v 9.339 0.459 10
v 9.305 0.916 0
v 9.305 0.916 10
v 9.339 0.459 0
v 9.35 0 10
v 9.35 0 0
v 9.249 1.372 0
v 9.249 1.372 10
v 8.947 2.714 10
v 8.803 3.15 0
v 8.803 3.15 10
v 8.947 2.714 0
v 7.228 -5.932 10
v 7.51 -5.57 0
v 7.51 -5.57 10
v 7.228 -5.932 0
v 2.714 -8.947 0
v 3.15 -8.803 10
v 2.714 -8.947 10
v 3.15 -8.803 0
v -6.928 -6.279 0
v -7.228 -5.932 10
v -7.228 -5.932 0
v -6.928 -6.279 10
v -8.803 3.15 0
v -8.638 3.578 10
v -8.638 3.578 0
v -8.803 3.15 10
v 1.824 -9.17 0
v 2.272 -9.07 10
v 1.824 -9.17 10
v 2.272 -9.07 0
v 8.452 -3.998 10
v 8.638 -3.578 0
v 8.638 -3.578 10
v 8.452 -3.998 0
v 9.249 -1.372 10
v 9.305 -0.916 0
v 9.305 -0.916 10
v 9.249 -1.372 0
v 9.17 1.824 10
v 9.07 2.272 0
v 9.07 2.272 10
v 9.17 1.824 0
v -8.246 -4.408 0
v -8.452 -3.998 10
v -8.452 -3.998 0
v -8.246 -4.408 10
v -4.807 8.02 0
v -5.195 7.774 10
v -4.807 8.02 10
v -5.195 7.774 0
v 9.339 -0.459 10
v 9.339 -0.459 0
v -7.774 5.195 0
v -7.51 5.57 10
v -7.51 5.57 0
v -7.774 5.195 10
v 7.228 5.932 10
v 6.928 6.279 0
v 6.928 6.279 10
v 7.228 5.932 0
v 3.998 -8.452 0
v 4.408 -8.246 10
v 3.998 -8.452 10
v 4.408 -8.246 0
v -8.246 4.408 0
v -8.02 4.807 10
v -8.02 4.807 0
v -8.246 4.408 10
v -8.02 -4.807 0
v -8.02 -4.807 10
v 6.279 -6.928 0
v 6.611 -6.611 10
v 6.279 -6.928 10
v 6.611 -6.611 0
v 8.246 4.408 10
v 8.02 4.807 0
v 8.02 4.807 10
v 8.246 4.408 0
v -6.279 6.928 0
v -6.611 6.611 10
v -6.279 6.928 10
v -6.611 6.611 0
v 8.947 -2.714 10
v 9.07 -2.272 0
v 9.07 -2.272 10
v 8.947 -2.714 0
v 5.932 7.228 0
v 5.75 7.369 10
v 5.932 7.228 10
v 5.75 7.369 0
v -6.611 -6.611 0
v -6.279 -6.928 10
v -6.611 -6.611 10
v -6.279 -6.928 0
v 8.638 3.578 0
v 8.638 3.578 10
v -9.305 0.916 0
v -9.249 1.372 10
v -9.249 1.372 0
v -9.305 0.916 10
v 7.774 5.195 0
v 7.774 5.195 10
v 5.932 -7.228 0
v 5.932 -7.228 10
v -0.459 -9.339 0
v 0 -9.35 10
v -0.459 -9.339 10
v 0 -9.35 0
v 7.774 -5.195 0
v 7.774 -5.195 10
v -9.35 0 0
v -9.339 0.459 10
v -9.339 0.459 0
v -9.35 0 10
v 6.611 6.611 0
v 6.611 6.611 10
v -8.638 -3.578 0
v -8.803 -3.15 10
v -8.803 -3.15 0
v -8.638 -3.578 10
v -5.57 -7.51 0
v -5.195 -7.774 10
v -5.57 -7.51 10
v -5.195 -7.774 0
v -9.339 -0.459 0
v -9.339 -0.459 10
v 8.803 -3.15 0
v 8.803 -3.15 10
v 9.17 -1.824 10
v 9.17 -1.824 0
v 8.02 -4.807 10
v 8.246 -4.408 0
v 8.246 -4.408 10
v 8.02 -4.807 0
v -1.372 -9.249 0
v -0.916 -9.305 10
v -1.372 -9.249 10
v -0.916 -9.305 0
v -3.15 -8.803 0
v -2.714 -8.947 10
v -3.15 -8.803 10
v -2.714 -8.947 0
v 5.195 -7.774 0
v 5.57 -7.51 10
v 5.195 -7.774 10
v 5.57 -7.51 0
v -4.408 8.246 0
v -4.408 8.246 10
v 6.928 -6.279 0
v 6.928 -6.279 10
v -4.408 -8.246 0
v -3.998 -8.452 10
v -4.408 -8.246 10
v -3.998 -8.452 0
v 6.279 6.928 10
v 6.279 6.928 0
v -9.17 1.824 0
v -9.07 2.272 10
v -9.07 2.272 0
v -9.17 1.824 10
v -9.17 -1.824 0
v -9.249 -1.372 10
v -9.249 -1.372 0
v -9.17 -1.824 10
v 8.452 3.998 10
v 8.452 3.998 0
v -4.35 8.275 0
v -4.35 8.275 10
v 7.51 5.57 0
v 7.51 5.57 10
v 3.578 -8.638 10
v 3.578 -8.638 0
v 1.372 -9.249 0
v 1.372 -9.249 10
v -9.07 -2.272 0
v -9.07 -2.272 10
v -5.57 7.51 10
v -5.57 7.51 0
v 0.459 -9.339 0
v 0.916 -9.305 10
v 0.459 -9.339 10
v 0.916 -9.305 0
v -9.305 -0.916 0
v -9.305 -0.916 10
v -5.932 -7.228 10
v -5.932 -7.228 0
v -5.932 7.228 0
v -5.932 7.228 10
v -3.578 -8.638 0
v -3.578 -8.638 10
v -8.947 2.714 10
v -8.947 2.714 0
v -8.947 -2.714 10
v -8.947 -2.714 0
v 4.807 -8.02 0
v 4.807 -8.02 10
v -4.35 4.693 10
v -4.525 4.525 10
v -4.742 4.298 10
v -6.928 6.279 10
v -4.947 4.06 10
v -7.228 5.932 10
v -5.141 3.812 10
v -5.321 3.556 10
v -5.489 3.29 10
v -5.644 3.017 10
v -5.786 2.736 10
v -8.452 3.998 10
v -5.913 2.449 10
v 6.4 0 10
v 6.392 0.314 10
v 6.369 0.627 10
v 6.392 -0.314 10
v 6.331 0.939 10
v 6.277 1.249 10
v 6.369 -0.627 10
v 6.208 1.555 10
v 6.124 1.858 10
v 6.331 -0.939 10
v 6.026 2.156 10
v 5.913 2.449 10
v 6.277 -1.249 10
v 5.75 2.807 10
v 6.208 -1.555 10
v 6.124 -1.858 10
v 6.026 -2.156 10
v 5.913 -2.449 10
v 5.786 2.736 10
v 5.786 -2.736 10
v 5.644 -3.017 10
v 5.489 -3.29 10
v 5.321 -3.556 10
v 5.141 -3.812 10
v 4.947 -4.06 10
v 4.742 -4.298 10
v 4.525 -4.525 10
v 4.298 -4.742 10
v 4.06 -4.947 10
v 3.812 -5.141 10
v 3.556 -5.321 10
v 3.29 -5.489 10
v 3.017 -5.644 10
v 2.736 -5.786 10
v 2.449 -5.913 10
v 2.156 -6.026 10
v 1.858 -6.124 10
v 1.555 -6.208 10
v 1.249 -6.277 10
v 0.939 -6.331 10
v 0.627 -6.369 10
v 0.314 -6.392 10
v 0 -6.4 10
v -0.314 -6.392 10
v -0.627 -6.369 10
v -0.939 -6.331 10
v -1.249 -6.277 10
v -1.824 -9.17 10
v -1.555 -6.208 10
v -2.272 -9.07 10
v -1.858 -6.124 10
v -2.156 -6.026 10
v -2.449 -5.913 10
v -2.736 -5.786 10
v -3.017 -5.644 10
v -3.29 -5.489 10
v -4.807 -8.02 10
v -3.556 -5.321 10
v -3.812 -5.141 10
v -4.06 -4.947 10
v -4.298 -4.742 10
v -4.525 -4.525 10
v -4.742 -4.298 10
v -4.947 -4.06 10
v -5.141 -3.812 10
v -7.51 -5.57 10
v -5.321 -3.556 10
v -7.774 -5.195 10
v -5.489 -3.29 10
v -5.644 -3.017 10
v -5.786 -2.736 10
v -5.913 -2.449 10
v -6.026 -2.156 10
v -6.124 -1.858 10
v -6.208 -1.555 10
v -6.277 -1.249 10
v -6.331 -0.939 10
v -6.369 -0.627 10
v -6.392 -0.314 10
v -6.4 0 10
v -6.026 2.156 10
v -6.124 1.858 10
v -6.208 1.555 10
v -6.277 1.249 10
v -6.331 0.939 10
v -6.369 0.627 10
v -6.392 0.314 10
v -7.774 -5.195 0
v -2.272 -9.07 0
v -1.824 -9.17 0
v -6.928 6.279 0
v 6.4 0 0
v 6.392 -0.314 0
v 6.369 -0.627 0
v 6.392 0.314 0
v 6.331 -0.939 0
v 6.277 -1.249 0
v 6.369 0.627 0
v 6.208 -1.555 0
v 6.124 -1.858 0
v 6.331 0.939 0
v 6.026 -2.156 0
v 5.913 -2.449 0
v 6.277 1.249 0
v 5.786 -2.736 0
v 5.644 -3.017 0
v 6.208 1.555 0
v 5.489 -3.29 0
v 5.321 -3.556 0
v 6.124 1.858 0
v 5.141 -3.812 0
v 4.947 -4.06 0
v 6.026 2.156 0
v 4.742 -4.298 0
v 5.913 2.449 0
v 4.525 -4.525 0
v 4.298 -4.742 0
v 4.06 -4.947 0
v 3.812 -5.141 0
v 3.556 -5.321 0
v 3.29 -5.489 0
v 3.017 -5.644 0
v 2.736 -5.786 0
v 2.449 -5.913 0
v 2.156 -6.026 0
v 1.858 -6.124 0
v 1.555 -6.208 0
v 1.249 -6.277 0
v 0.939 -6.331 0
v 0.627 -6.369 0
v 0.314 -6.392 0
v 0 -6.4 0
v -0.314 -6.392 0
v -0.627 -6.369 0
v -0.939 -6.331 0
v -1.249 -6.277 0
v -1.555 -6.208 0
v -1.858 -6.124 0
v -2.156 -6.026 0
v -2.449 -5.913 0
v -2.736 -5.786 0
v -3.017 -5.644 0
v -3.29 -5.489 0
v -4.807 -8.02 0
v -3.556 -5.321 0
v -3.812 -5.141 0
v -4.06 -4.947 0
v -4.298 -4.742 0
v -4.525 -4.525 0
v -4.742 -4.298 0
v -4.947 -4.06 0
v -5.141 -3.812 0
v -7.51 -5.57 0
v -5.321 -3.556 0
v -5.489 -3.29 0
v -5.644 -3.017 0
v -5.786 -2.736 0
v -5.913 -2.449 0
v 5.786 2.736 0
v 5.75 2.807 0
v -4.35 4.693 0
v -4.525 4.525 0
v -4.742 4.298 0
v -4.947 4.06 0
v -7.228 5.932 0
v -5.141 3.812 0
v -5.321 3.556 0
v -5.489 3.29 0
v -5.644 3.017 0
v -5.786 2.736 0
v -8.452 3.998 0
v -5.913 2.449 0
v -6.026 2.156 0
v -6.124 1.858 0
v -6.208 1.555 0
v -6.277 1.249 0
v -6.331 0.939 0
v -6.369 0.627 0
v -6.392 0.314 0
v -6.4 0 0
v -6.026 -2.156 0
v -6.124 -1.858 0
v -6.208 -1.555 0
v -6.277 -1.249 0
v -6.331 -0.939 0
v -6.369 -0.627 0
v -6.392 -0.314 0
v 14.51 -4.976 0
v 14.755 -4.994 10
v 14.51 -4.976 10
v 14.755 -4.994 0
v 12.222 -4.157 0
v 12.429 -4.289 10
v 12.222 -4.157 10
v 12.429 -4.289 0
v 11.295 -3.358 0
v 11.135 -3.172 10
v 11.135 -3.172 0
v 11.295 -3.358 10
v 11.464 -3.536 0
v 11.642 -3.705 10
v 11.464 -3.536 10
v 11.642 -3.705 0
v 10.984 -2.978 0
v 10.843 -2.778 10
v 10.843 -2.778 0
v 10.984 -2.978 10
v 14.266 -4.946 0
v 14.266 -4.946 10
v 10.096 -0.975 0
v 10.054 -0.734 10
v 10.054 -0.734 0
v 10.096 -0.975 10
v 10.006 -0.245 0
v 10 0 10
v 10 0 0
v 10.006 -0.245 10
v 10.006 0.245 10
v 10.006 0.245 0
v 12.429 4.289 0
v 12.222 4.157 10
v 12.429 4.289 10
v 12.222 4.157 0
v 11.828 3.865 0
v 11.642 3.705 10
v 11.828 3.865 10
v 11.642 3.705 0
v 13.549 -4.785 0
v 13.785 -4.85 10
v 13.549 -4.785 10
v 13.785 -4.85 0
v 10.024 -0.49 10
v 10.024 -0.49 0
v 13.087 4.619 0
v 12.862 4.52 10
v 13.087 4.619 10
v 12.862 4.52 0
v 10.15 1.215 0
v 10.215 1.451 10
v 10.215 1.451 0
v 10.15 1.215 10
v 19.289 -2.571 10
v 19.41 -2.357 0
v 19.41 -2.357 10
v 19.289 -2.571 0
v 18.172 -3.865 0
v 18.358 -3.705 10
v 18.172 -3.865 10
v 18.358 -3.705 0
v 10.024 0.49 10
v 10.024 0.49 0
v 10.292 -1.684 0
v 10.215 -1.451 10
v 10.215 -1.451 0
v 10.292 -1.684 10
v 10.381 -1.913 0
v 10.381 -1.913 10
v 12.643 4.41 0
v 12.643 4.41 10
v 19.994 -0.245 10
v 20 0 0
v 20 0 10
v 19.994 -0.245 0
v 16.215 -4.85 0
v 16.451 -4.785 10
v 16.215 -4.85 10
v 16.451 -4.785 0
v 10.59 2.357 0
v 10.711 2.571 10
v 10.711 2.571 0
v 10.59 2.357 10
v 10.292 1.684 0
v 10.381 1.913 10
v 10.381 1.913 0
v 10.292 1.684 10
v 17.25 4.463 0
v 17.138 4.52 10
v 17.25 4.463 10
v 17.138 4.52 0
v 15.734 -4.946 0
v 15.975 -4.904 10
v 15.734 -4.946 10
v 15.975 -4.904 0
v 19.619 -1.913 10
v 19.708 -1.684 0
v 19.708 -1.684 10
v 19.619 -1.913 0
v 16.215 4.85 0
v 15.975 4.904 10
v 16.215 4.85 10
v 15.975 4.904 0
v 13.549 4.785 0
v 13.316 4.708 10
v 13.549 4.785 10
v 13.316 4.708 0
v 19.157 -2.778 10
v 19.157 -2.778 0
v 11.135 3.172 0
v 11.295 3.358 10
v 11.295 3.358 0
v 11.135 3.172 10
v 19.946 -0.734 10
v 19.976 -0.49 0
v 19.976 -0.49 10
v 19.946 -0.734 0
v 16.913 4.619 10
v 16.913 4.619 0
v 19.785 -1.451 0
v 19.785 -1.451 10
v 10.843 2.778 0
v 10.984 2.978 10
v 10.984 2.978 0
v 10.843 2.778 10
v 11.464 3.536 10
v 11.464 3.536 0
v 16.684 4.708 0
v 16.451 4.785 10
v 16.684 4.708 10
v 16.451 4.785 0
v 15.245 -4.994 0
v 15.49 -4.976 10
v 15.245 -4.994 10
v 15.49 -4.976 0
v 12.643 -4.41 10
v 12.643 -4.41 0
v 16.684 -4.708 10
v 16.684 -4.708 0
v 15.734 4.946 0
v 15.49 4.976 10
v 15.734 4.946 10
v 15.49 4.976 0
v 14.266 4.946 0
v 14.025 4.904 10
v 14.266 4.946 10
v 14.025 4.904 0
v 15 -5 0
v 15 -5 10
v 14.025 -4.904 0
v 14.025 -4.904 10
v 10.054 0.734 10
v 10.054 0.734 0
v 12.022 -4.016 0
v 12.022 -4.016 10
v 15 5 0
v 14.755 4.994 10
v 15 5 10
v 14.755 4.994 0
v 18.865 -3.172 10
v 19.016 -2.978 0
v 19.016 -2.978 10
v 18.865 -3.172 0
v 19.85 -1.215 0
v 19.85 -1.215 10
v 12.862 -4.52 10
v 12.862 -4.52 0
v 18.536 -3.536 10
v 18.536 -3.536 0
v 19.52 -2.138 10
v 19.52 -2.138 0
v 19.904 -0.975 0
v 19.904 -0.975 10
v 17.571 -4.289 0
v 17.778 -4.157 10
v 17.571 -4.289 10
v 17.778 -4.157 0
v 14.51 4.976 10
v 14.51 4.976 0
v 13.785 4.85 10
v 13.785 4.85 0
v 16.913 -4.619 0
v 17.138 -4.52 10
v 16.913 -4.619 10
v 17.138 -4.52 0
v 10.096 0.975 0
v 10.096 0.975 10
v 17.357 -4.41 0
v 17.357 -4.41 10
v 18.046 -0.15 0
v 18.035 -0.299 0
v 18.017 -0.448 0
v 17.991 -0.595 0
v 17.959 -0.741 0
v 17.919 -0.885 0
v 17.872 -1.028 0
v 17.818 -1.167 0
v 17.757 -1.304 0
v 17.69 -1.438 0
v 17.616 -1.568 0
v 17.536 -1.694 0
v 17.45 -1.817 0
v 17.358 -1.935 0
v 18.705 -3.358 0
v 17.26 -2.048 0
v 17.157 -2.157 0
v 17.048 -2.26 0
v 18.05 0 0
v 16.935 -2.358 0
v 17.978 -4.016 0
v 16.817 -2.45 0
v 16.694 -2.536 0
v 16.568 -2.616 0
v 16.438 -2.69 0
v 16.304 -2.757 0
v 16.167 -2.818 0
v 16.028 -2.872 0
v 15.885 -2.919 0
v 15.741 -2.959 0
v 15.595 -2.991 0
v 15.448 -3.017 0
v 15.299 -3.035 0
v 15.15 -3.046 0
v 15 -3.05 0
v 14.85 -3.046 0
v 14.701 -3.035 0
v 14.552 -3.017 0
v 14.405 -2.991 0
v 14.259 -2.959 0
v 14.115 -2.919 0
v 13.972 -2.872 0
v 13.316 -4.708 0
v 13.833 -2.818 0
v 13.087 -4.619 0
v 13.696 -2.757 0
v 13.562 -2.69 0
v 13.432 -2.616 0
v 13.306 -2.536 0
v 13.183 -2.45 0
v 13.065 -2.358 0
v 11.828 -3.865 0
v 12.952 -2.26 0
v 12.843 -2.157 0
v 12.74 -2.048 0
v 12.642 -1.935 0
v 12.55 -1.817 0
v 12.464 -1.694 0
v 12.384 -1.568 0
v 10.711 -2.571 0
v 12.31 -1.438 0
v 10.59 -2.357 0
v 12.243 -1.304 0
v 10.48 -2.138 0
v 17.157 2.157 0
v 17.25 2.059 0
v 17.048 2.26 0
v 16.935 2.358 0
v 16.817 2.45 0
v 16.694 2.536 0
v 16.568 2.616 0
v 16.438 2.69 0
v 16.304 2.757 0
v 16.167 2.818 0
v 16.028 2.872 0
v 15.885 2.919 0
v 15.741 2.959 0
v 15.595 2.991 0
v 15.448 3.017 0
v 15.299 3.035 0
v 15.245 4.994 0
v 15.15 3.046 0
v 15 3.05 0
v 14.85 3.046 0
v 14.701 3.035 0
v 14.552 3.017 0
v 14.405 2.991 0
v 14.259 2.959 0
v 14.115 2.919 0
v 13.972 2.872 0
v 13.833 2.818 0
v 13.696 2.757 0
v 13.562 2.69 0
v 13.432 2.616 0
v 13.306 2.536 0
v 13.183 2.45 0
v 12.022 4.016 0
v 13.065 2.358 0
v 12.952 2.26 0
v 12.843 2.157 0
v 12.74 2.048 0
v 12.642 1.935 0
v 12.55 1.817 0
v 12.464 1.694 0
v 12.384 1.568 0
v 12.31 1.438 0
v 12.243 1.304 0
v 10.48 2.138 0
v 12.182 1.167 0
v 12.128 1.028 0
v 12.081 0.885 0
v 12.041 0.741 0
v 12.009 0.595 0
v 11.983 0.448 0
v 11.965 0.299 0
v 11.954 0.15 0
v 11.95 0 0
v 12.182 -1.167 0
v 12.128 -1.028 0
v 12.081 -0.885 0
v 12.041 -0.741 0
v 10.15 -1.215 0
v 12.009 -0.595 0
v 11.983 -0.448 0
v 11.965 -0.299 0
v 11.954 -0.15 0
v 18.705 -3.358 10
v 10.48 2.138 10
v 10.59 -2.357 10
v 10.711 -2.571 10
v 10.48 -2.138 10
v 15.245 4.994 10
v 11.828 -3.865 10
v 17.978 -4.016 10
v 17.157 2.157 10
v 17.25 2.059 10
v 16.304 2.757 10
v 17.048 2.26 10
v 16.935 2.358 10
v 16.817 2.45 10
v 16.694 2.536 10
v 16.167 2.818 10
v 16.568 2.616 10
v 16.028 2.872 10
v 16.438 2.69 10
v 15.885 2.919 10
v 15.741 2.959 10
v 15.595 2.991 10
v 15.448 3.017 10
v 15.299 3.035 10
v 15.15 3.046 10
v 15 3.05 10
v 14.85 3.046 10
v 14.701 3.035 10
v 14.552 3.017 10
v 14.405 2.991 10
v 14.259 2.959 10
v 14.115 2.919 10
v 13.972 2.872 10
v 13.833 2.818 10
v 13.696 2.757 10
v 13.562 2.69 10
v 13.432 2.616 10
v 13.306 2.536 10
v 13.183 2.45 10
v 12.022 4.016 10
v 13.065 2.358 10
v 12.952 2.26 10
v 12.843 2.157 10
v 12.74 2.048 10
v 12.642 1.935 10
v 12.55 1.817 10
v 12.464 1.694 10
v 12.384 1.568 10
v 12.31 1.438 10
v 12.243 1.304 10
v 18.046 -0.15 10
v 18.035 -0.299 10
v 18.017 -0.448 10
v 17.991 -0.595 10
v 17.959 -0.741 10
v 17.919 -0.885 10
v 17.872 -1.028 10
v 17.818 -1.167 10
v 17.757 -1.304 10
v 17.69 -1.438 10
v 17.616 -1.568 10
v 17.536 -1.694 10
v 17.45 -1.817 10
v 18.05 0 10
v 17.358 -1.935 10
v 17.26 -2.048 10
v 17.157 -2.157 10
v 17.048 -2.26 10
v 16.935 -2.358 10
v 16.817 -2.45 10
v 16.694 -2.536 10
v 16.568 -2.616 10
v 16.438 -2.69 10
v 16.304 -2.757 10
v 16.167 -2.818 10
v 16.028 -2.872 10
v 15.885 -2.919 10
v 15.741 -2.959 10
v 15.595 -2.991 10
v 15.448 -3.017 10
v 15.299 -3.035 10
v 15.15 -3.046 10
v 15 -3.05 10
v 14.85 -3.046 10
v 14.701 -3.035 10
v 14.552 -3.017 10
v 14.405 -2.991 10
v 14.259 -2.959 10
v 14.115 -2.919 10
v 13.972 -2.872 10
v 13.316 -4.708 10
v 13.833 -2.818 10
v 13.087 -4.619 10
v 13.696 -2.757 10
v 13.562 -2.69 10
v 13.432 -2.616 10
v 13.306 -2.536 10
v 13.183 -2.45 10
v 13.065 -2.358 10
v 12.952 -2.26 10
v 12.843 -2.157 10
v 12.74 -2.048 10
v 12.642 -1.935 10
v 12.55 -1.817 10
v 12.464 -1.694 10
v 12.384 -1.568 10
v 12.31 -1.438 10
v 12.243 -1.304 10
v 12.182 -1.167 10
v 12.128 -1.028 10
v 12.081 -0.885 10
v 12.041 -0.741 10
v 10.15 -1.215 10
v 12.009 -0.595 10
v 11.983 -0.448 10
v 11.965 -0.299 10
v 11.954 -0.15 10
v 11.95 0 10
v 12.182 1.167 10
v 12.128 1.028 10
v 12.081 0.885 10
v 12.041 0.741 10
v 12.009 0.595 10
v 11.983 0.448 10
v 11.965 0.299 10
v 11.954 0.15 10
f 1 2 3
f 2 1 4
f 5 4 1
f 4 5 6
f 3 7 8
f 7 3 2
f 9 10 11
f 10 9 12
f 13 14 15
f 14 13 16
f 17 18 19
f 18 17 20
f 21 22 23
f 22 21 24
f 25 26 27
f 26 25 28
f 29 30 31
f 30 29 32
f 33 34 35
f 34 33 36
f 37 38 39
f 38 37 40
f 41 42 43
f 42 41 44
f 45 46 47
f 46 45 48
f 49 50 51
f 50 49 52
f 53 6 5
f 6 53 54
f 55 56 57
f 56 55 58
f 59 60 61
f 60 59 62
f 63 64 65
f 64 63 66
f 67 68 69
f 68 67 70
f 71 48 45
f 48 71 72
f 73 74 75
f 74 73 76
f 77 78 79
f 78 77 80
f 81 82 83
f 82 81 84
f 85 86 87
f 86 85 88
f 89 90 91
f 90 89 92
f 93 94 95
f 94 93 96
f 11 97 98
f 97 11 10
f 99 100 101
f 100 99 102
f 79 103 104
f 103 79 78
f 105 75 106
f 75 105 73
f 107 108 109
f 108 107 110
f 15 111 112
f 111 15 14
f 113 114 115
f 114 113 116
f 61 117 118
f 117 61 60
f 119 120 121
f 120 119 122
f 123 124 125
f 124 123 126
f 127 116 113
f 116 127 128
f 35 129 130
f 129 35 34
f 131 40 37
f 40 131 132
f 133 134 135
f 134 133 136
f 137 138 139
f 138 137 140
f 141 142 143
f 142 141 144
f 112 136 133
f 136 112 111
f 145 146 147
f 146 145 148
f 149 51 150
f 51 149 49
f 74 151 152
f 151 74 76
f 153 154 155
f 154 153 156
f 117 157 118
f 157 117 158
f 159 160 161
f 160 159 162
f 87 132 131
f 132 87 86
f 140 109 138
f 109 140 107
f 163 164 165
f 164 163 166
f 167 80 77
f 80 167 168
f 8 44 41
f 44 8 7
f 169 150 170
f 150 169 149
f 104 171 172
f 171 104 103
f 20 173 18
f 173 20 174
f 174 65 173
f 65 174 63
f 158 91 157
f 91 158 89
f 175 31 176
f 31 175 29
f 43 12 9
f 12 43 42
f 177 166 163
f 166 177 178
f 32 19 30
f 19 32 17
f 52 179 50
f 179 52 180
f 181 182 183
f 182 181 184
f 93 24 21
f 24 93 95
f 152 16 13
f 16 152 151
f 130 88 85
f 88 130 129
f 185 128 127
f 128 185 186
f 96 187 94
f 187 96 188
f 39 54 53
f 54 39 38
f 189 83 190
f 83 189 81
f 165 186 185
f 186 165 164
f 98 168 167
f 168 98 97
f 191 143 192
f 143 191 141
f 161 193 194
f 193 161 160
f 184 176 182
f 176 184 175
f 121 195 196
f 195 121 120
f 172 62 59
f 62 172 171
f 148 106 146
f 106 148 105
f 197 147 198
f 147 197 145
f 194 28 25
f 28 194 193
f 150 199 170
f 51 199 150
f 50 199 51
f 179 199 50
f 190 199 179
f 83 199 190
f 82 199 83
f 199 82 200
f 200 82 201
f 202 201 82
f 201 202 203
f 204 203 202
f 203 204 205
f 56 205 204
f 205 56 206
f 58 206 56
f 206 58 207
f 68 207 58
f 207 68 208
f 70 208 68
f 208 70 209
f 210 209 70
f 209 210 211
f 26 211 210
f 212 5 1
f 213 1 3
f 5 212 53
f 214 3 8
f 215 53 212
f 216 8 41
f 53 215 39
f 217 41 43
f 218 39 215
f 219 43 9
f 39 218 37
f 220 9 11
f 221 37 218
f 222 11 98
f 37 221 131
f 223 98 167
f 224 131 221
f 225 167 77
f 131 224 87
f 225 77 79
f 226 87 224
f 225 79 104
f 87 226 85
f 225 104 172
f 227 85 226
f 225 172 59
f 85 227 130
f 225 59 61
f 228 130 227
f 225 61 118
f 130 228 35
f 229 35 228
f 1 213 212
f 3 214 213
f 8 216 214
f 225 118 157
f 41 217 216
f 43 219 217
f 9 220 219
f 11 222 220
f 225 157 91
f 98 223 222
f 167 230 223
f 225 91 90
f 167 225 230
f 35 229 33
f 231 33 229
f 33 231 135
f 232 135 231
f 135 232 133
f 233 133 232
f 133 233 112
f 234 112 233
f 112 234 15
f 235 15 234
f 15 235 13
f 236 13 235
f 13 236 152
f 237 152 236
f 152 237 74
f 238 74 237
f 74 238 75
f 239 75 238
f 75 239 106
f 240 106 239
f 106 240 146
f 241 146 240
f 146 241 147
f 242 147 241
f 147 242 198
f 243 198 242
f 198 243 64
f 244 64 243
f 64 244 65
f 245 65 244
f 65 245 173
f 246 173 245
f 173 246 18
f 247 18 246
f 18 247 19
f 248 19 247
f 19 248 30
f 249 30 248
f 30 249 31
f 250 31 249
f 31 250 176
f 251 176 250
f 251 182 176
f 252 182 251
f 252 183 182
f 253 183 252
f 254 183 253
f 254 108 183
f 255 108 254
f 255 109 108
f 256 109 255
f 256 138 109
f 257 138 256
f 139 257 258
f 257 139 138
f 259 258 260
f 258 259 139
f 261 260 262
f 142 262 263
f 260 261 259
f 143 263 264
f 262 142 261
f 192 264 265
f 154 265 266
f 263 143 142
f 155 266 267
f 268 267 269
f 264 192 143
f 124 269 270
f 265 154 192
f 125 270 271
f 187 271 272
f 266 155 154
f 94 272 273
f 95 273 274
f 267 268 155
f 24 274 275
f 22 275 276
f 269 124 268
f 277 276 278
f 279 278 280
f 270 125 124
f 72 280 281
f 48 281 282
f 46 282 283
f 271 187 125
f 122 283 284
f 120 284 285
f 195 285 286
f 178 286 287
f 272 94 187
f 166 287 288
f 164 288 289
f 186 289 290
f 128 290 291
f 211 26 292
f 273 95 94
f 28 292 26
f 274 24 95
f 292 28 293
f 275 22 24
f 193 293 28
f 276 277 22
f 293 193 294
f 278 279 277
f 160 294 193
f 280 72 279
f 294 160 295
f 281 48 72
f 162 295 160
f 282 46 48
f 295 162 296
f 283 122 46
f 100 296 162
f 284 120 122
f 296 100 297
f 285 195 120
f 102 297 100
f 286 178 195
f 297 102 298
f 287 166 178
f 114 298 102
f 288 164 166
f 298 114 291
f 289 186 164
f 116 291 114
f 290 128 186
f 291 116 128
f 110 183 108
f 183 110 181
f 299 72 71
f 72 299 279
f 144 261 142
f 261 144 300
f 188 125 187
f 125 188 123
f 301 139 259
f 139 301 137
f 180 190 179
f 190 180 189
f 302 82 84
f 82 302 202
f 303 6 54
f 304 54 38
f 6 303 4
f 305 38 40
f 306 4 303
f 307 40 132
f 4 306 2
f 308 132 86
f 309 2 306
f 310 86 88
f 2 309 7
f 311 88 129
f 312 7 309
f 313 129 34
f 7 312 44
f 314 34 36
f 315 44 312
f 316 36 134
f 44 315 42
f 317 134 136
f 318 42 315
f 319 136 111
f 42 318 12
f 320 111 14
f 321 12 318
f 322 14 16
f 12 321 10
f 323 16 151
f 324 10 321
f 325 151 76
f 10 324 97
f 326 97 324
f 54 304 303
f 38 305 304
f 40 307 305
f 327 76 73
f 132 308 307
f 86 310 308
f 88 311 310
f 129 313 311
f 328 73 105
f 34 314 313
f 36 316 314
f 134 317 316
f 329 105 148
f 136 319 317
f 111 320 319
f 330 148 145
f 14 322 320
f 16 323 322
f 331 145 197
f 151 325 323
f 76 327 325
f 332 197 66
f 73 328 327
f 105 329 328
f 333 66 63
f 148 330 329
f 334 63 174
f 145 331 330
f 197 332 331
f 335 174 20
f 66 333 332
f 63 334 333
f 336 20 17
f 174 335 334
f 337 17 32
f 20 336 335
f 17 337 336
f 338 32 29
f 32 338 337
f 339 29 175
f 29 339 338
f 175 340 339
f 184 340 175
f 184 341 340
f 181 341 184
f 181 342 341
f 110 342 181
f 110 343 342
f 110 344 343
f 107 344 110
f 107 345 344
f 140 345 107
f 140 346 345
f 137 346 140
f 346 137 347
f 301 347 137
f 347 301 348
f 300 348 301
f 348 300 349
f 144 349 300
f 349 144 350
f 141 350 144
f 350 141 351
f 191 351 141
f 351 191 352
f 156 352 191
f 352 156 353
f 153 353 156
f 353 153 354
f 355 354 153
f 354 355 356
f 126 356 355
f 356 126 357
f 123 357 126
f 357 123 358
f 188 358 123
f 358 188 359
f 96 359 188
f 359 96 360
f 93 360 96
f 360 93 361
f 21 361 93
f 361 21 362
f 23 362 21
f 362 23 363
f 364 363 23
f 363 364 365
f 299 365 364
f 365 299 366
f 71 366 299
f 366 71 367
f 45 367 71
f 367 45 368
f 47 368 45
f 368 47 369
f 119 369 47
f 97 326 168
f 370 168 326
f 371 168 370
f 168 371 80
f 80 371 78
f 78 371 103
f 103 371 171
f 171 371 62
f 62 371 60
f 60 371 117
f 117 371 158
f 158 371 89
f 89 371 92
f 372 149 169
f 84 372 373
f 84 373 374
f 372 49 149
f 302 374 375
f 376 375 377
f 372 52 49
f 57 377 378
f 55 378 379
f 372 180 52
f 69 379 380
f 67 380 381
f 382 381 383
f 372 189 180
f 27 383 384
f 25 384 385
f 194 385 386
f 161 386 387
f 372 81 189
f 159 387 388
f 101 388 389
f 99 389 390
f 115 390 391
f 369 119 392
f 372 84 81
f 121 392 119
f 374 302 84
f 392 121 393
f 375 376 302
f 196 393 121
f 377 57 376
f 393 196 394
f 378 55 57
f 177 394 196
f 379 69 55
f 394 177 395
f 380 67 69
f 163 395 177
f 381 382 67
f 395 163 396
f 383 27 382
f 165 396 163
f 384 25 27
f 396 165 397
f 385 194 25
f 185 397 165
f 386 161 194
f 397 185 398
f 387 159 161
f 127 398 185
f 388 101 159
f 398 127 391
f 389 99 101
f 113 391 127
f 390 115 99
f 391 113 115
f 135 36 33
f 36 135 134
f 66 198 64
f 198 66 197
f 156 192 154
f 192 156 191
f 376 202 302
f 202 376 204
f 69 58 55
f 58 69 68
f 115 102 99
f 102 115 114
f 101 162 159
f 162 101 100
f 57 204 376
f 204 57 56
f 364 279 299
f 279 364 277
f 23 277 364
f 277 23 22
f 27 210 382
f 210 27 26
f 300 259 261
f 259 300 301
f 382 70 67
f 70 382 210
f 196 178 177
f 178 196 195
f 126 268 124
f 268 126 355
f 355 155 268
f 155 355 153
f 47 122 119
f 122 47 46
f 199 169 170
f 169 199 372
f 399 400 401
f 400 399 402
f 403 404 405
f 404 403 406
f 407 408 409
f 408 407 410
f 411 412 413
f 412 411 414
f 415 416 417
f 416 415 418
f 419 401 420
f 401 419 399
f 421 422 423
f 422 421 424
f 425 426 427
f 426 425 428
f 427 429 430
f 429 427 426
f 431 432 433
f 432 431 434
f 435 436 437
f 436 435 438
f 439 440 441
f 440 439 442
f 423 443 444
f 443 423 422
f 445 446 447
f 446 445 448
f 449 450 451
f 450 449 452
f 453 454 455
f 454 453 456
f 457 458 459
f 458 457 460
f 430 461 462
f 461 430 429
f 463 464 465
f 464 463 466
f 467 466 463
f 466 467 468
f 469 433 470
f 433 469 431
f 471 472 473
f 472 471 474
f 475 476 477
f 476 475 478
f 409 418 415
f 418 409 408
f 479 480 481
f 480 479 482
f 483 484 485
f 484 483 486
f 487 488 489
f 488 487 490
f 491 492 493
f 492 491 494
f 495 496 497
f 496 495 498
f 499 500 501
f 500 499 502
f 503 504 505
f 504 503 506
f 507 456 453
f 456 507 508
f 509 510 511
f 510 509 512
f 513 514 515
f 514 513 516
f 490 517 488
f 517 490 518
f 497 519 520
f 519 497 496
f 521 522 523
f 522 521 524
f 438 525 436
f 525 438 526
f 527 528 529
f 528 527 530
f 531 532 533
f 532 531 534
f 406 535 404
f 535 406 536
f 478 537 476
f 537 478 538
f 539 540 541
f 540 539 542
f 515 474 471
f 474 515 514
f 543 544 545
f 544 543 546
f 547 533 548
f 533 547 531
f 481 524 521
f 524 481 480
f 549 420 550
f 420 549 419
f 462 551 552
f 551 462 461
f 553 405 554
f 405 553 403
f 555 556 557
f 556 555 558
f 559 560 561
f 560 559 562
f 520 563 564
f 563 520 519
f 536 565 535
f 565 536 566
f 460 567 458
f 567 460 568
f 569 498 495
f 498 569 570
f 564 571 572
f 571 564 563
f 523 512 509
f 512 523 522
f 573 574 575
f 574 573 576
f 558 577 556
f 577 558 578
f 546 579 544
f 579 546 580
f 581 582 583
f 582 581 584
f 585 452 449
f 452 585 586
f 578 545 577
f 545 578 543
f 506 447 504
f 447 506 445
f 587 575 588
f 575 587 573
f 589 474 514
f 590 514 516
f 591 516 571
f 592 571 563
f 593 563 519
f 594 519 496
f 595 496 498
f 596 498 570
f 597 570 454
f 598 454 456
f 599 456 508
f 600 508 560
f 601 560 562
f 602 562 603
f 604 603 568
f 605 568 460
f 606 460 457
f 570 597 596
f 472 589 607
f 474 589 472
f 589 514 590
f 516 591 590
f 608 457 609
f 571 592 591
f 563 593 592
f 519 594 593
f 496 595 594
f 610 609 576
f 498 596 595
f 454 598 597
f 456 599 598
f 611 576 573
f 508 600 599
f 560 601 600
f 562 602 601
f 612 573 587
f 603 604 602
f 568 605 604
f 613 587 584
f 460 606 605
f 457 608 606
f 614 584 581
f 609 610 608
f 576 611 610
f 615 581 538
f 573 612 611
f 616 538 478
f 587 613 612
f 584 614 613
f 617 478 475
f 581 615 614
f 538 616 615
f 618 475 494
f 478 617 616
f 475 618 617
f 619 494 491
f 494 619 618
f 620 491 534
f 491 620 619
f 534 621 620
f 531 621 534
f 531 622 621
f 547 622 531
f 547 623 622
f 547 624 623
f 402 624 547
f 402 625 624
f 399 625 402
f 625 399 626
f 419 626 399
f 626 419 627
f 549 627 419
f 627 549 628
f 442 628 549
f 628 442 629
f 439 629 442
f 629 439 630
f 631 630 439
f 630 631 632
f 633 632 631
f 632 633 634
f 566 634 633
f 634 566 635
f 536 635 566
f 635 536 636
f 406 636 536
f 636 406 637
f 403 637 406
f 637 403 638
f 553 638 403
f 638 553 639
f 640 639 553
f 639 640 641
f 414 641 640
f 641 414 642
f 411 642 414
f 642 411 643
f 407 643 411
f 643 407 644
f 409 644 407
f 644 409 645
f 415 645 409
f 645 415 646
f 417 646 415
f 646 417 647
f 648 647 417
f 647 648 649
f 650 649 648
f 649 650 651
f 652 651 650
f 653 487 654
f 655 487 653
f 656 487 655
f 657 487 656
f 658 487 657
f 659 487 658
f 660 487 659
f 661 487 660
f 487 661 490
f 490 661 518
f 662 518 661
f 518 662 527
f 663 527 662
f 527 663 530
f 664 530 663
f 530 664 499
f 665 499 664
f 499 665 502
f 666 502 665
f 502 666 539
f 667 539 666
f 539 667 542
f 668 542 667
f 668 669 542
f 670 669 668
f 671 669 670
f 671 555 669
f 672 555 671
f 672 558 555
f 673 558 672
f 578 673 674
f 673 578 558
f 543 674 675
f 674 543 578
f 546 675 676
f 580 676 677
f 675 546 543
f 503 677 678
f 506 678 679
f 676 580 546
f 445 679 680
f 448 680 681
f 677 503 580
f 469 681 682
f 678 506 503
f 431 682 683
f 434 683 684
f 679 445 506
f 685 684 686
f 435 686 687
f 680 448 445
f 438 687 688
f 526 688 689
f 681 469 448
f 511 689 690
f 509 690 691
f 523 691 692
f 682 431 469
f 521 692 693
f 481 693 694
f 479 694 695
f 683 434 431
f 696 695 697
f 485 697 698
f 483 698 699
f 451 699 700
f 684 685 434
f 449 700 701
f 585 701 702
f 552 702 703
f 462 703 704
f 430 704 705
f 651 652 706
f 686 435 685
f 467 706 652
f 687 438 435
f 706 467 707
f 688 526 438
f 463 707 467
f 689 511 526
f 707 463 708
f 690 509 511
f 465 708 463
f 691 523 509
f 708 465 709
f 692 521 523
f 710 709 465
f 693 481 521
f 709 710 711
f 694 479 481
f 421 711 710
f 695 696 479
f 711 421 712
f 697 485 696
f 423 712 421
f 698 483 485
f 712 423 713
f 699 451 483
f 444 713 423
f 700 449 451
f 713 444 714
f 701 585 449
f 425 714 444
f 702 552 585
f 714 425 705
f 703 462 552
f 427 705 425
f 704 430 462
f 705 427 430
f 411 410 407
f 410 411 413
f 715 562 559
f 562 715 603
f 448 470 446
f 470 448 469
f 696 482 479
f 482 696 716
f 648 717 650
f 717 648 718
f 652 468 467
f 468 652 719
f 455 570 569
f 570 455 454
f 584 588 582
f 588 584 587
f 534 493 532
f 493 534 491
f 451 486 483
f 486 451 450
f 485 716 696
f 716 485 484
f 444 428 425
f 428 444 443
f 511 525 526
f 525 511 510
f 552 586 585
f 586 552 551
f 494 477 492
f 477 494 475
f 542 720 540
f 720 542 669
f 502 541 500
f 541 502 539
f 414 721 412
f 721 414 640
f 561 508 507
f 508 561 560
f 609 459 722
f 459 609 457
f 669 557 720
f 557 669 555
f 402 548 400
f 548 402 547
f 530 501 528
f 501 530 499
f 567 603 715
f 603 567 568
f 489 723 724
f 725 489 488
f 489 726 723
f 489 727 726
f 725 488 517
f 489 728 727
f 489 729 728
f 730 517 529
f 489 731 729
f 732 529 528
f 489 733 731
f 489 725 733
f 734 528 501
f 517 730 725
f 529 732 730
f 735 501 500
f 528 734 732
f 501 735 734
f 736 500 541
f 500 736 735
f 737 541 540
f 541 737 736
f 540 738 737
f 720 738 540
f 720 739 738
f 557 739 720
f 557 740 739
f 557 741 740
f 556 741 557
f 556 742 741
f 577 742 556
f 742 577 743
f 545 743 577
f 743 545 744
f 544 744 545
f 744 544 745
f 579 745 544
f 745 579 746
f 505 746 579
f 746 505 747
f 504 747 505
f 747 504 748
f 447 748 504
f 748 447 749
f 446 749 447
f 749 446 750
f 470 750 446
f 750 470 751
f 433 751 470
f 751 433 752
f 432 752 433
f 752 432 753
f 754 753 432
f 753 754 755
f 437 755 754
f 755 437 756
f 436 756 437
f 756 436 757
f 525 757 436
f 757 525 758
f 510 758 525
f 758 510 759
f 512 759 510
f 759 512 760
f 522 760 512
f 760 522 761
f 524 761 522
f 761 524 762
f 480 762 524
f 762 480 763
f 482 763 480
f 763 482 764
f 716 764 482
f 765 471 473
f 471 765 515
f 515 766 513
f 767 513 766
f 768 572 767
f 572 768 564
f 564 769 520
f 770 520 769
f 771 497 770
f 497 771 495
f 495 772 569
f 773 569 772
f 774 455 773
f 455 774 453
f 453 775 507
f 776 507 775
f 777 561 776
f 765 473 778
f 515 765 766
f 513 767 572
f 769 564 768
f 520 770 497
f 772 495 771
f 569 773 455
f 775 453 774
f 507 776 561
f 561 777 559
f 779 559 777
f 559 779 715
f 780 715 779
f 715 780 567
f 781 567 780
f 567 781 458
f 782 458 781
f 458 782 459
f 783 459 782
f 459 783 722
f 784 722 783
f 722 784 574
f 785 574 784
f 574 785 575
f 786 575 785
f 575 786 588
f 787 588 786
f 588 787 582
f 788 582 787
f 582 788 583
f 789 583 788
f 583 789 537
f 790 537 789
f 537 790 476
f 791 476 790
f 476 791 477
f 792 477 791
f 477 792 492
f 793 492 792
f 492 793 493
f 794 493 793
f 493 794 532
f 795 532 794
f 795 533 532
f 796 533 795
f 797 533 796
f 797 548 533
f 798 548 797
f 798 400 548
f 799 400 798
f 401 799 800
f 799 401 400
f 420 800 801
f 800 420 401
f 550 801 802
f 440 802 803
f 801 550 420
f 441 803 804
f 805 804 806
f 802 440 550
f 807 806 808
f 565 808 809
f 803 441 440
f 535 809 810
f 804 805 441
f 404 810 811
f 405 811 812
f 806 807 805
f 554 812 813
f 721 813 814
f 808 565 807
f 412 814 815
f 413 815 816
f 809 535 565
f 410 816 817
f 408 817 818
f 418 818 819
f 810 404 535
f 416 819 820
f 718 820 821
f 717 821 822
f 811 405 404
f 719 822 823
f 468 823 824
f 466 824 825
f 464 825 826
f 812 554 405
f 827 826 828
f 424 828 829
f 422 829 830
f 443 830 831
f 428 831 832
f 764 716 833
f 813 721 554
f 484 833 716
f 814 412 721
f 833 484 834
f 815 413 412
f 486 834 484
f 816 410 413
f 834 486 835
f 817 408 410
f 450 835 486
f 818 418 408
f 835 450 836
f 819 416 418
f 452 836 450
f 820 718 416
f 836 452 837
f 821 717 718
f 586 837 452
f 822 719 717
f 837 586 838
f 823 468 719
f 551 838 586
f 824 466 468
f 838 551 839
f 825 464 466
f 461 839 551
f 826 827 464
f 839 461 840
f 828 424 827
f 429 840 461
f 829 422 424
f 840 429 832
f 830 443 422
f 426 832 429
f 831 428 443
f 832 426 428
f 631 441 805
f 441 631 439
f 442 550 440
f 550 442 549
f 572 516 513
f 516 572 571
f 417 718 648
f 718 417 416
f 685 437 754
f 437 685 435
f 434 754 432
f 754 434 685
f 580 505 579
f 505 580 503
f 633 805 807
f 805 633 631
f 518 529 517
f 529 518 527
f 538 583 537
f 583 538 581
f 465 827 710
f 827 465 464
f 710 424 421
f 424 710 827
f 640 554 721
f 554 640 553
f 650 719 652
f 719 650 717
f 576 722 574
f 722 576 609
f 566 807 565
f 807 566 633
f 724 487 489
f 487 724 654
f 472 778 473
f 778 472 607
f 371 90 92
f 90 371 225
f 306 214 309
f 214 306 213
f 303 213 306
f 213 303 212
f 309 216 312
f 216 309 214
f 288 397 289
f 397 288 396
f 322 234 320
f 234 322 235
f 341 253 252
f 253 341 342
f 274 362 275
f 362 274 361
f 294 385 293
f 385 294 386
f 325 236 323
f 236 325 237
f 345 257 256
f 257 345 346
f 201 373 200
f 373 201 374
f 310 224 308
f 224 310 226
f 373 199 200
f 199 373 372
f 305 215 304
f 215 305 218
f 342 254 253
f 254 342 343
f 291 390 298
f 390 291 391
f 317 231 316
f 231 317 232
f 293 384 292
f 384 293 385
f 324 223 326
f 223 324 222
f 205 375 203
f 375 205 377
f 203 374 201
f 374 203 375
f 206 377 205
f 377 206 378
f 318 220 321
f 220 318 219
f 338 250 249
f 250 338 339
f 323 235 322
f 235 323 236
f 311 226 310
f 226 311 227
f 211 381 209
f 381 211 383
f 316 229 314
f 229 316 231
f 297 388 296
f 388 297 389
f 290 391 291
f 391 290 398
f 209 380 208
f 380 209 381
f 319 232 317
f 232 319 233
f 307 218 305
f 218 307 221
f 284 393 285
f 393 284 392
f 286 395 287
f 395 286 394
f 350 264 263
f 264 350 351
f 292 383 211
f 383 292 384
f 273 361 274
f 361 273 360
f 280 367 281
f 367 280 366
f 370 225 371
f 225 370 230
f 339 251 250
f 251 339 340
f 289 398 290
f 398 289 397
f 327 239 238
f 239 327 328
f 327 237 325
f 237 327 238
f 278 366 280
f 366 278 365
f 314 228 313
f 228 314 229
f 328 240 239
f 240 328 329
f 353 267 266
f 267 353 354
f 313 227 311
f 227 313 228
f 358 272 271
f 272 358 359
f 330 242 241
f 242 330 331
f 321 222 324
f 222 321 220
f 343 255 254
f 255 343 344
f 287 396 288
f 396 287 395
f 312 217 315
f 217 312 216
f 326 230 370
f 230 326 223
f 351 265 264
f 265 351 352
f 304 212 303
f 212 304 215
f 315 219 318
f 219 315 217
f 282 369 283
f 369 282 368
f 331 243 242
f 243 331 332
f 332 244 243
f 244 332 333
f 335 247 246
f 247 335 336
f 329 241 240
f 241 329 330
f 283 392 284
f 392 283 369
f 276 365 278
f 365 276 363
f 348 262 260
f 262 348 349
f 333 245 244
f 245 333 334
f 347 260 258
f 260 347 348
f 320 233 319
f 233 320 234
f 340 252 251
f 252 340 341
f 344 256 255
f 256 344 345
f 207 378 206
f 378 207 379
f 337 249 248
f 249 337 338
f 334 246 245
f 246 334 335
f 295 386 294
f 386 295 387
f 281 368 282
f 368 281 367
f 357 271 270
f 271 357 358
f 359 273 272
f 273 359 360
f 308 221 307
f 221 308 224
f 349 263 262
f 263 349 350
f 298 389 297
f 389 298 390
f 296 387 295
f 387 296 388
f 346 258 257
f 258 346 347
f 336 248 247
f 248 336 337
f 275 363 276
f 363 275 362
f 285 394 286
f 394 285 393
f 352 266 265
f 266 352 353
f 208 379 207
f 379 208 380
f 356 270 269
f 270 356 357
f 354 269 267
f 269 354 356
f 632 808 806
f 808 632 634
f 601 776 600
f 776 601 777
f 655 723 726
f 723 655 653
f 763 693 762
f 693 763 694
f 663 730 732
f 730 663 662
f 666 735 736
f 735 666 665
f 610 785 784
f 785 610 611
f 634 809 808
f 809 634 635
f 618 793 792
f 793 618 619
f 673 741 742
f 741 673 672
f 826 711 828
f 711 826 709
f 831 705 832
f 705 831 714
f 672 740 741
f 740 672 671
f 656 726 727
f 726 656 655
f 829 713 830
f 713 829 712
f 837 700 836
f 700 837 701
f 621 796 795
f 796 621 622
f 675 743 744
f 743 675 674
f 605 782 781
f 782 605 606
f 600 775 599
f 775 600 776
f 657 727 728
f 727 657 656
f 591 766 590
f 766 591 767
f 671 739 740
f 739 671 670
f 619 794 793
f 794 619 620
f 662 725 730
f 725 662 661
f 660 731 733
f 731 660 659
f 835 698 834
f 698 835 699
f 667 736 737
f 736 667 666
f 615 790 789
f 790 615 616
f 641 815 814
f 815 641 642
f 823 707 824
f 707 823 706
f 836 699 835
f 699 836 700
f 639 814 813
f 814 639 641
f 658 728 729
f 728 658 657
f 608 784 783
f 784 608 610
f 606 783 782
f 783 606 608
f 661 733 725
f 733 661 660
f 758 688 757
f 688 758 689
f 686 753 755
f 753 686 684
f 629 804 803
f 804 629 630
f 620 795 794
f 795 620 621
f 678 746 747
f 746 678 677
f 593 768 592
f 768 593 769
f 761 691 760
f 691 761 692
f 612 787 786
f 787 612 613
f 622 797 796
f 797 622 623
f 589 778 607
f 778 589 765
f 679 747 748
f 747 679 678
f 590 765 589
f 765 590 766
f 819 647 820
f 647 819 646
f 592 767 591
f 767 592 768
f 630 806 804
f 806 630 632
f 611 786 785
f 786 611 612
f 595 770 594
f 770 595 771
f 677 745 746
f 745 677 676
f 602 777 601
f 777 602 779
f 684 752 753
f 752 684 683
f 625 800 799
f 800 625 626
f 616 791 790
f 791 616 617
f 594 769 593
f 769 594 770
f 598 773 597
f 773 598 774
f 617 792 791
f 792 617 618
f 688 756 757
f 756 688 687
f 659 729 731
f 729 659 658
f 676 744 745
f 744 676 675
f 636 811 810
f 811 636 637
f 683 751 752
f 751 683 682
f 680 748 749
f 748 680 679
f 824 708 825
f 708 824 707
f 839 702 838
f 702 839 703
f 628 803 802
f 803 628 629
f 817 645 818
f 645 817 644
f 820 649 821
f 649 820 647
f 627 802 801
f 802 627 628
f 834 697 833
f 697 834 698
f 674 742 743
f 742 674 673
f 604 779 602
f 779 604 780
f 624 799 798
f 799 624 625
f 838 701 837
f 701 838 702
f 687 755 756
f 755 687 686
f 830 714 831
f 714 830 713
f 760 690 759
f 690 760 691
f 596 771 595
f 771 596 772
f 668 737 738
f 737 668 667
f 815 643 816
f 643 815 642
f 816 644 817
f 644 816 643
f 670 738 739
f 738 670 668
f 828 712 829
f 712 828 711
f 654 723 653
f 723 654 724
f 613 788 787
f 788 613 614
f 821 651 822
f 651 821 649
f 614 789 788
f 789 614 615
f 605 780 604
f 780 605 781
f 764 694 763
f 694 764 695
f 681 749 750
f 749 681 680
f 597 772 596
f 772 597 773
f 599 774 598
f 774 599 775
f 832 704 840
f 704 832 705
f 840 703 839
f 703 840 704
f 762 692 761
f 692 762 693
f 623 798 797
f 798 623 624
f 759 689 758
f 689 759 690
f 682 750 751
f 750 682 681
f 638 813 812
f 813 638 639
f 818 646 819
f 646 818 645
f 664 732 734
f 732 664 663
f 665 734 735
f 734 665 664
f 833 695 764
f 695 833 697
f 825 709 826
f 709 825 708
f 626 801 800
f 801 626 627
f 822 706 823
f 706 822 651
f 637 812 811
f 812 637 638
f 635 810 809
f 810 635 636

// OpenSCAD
// Snap-on Clip for Lab Stand Rod and Tubing
// Orientation: Flat on XY plane, building upward (+Z)
// Units: Millimetres

// --- Dimensions ---
// Rod Ring
$rod_inner_d = 12.7;   // Inner diameter for 1/2" rod
$rod_wall = 3;         // Wall thickness
$rod_outer_d = $rod_inner_d + 2 * $rod_wall; // 18.7 mm
$rod_height = 10;      // Extrusion height (Z)
$rod_cut_width = 10;   // Width of opening on -X side

// Tubing Ring
$tube_inner_d = 6;     // Inner diameter
$tube_wall = 2;        // Wall thickness
$tube_outer_d = $tube_inner_d + 2 * $tube_wall; // 10 mm
$tube_x_pos = 15;      // Center X position
$tube_cut_width = 4.5; // Width of opening on +X side

// Bridge
$bridge_width_x = 4;   // Width in X (from 8 to 12)
$bridge_height_y = 6;  // Height in Y
$bridge_z = $rod_height; // Same height as extrusion

// --- Configuration ---
$fn = 128;             // High resolution for smooth curves

// --- Main Body Construction ---
difference() {
    // 1. Create the solid extrusion of the 2D profile
    union() {
        // Rod Ring
        translate([0, 0, 0]) {
            difference() {
                // Outer Ring
                cylinder(h = $rod_height, d = $rod_outer_d, center = [0, 0, $rod_height/2]);
                
                // Inner Hole (Rod passes through)
                cylinder(h = $rod_height, d = $rod_inner_d, center = [0, 0, $rod_height/2]);
                
                // Cutout on -X side (Opening)
                // Defined as a rectangular prism to cut through the ring
                translate([-($rod_outer_d/2) + ($rod_cut_width/2), 0, 0]) {
                    cube([
                        $rod_cut_width, 
                        $rod_outer_d, 
                        $rod_height + 0.1
                    ]);
                }
            }
        }
        
        // Tubing Ring
        translate([$tube_x_pos, 0, 0]) {
            difference() {
                // Outer Ring
                cylinder(h = $rod_height, d = $tube_outer_d, center = [0, 0, $rod_height/2]);
                
                // Inner Hole (Tubing passes through)
                cylinder(h = $rod_height, d = $tube_inner_d, center = [0, 0, $rod_height/2]);
                
                // Cutout on +X side (Opening)
                translate([$tube_cut_width/2, 0, 0]) {
                    cube([
                        $tube_cut_width, 
                        $tube_outer_d, 
                        $rod_height + 0.1
                    ]);
                }
            }
        }
        
        // Solid Bridge
        translate([$bridge_width_x/2, 0, 0]) {
            cube([
                $bridge_width_x, 
                $bridge_height_y, 
                $rod_height
            ]);
        }
    }
    
    // 2. Cutouts to ensure clean separation and fit (Offset by 0.1mm)
    
    // Cutout for Rod Ring Opening
    translate([-($rod_outer_d/2) + ($rod_cut_width/2), 0, 0]) {
        cube([
            $rod_cut_width + 0.1, 
            $rod_outer_d + 0.1, 
            $rod_height + 0.1
        ]);
    }
    
    // Cutout for Tubing Ring Opening
    translate([$tube_x_pos + $tube_cut_width/2, 0, 0]) {
        cube([
            $tube_cut_width + 0.1, 
            $tube_outer_d + 0.1, 
            $rod_height + 0.1
        ]);
    }
    
    // Cutout for Rod Inner Hole
    translate([0, 0, 0]) {
        cylinder(h = $rod_height + 0.1, d = $rod_inner_d + 0.1, center = [0, 0, $rod_height/2]);
    }
    
    // Cutout for Tubing Inner Hole
    translate([$tube_x_pos, 0, 0]) {
        cylinder(h = $rod_height + 0.1, d = $tube_inner_d + 0.1, center = [0, 0, $rod_height/2]);
    }
}
